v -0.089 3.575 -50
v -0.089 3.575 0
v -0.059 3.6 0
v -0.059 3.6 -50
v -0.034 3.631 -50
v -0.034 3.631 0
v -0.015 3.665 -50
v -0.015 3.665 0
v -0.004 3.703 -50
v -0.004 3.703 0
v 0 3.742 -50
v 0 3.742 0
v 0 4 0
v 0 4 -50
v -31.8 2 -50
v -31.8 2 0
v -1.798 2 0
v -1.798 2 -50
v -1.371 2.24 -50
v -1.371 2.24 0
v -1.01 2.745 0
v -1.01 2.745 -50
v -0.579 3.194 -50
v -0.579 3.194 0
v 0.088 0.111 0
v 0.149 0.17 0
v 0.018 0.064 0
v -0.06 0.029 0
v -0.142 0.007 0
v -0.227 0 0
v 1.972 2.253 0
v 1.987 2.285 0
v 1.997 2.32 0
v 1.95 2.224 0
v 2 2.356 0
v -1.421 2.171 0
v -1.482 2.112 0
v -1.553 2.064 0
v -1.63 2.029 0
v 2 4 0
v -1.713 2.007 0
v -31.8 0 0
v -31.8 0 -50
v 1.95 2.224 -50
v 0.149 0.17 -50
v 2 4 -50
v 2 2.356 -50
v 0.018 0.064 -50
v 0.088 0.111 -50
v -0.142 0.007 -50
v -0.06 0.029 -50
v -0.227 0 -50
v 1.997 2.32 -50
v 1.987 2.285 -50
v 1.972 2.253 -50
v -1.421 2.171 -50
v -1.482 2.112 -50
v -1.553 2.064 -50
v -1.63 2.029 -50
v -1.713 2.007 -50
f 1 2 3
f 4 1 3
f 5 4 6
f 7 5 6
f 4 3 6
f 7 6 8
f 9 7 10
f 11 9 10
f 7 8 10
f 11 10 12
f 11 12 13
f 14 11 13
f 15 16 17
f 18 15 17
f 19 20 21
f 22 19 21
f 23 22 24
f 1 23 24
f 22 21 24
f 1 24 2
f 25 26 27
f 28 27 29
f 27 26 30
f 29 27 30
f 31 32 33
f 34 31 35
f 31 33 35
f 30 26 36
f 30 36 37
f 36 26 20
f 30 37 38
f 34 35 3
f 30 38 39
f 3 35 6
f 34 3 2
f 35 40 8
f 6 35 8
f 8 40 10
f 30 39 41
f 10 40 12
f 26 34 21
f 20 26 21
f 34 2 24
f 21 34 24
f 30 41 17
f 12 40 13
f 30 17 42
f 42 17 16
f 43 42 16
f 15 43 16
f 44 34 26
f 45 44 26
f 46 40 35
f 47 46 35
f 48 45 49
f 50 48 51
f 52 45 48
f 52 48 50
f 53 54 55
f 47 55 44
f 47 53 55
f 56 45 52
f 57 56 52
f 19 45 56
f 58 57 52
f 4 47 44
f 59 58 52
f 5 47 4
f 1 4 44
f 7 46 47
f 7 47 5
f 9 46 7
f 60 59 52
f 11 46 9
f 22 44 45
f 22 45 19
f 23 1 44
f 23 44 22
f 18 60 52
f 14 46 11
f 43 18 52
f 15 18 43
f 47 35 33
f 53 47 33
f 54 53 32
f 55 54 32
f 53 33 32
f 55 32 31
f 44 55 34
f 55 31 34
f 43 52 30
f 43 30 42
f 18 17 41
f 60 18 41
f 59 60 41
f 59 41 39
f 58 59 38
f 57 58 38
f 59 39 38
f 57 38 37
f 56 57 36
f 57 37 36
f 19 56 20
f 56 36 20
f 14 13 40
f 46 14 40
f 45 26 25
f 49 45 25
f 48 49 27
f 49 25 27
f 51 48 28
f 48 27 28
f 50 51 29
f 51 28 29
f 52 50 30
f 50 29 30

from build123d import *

# Parameters (mm, degrees)
BOSS_EXTRUDE1_DEPTH = 50


with BuildPart() as part:
    # Sketch1 → Boss-Extrude1 (new body)
    with BuildSketch(Plane.XY):
        with BuildLine():
            Line((-0.226533162, 0), (-31.8, 0))
            Line((-31.8, 0), (-31.8, 2))
            Line((-31.8, 2), (-1.79756025, 2))
            ThreePointArc((-1.79756025, 2), (-1.552823997, 2.063990635), (-1.370731057, 2.239583333))
            ThreePointArc((-1.370731057, 2.239583333), (-0.802551257, 2.977276557), (-0.088888889, 3.575361503))
            ThreePointArc((-0.088888889, 3.575361503), (-0.023616579, 3.647376483), (0, 3.741657387))
            Line((0, 3.741657387), (0, 4))
            Line((0, 4), (2, 4))
            Line((2, 4), (2, 2.355630783))
            ThreePointArc((2, 2.355630783), (1.987179561, 2.285176459), (1.950361882, 2.223754688))
            Line((1.950361882, 2.223754688), (0.149371544, 0.170309763))
            ThreePointArc((0.149371544, 0.170309763), (-0.020190145, 0.044563331), (-0.226533162, 0))
        make_face()
    extrude(amount=-BOSS_EXTRUDE1_DEPTH)


solid = part.part
